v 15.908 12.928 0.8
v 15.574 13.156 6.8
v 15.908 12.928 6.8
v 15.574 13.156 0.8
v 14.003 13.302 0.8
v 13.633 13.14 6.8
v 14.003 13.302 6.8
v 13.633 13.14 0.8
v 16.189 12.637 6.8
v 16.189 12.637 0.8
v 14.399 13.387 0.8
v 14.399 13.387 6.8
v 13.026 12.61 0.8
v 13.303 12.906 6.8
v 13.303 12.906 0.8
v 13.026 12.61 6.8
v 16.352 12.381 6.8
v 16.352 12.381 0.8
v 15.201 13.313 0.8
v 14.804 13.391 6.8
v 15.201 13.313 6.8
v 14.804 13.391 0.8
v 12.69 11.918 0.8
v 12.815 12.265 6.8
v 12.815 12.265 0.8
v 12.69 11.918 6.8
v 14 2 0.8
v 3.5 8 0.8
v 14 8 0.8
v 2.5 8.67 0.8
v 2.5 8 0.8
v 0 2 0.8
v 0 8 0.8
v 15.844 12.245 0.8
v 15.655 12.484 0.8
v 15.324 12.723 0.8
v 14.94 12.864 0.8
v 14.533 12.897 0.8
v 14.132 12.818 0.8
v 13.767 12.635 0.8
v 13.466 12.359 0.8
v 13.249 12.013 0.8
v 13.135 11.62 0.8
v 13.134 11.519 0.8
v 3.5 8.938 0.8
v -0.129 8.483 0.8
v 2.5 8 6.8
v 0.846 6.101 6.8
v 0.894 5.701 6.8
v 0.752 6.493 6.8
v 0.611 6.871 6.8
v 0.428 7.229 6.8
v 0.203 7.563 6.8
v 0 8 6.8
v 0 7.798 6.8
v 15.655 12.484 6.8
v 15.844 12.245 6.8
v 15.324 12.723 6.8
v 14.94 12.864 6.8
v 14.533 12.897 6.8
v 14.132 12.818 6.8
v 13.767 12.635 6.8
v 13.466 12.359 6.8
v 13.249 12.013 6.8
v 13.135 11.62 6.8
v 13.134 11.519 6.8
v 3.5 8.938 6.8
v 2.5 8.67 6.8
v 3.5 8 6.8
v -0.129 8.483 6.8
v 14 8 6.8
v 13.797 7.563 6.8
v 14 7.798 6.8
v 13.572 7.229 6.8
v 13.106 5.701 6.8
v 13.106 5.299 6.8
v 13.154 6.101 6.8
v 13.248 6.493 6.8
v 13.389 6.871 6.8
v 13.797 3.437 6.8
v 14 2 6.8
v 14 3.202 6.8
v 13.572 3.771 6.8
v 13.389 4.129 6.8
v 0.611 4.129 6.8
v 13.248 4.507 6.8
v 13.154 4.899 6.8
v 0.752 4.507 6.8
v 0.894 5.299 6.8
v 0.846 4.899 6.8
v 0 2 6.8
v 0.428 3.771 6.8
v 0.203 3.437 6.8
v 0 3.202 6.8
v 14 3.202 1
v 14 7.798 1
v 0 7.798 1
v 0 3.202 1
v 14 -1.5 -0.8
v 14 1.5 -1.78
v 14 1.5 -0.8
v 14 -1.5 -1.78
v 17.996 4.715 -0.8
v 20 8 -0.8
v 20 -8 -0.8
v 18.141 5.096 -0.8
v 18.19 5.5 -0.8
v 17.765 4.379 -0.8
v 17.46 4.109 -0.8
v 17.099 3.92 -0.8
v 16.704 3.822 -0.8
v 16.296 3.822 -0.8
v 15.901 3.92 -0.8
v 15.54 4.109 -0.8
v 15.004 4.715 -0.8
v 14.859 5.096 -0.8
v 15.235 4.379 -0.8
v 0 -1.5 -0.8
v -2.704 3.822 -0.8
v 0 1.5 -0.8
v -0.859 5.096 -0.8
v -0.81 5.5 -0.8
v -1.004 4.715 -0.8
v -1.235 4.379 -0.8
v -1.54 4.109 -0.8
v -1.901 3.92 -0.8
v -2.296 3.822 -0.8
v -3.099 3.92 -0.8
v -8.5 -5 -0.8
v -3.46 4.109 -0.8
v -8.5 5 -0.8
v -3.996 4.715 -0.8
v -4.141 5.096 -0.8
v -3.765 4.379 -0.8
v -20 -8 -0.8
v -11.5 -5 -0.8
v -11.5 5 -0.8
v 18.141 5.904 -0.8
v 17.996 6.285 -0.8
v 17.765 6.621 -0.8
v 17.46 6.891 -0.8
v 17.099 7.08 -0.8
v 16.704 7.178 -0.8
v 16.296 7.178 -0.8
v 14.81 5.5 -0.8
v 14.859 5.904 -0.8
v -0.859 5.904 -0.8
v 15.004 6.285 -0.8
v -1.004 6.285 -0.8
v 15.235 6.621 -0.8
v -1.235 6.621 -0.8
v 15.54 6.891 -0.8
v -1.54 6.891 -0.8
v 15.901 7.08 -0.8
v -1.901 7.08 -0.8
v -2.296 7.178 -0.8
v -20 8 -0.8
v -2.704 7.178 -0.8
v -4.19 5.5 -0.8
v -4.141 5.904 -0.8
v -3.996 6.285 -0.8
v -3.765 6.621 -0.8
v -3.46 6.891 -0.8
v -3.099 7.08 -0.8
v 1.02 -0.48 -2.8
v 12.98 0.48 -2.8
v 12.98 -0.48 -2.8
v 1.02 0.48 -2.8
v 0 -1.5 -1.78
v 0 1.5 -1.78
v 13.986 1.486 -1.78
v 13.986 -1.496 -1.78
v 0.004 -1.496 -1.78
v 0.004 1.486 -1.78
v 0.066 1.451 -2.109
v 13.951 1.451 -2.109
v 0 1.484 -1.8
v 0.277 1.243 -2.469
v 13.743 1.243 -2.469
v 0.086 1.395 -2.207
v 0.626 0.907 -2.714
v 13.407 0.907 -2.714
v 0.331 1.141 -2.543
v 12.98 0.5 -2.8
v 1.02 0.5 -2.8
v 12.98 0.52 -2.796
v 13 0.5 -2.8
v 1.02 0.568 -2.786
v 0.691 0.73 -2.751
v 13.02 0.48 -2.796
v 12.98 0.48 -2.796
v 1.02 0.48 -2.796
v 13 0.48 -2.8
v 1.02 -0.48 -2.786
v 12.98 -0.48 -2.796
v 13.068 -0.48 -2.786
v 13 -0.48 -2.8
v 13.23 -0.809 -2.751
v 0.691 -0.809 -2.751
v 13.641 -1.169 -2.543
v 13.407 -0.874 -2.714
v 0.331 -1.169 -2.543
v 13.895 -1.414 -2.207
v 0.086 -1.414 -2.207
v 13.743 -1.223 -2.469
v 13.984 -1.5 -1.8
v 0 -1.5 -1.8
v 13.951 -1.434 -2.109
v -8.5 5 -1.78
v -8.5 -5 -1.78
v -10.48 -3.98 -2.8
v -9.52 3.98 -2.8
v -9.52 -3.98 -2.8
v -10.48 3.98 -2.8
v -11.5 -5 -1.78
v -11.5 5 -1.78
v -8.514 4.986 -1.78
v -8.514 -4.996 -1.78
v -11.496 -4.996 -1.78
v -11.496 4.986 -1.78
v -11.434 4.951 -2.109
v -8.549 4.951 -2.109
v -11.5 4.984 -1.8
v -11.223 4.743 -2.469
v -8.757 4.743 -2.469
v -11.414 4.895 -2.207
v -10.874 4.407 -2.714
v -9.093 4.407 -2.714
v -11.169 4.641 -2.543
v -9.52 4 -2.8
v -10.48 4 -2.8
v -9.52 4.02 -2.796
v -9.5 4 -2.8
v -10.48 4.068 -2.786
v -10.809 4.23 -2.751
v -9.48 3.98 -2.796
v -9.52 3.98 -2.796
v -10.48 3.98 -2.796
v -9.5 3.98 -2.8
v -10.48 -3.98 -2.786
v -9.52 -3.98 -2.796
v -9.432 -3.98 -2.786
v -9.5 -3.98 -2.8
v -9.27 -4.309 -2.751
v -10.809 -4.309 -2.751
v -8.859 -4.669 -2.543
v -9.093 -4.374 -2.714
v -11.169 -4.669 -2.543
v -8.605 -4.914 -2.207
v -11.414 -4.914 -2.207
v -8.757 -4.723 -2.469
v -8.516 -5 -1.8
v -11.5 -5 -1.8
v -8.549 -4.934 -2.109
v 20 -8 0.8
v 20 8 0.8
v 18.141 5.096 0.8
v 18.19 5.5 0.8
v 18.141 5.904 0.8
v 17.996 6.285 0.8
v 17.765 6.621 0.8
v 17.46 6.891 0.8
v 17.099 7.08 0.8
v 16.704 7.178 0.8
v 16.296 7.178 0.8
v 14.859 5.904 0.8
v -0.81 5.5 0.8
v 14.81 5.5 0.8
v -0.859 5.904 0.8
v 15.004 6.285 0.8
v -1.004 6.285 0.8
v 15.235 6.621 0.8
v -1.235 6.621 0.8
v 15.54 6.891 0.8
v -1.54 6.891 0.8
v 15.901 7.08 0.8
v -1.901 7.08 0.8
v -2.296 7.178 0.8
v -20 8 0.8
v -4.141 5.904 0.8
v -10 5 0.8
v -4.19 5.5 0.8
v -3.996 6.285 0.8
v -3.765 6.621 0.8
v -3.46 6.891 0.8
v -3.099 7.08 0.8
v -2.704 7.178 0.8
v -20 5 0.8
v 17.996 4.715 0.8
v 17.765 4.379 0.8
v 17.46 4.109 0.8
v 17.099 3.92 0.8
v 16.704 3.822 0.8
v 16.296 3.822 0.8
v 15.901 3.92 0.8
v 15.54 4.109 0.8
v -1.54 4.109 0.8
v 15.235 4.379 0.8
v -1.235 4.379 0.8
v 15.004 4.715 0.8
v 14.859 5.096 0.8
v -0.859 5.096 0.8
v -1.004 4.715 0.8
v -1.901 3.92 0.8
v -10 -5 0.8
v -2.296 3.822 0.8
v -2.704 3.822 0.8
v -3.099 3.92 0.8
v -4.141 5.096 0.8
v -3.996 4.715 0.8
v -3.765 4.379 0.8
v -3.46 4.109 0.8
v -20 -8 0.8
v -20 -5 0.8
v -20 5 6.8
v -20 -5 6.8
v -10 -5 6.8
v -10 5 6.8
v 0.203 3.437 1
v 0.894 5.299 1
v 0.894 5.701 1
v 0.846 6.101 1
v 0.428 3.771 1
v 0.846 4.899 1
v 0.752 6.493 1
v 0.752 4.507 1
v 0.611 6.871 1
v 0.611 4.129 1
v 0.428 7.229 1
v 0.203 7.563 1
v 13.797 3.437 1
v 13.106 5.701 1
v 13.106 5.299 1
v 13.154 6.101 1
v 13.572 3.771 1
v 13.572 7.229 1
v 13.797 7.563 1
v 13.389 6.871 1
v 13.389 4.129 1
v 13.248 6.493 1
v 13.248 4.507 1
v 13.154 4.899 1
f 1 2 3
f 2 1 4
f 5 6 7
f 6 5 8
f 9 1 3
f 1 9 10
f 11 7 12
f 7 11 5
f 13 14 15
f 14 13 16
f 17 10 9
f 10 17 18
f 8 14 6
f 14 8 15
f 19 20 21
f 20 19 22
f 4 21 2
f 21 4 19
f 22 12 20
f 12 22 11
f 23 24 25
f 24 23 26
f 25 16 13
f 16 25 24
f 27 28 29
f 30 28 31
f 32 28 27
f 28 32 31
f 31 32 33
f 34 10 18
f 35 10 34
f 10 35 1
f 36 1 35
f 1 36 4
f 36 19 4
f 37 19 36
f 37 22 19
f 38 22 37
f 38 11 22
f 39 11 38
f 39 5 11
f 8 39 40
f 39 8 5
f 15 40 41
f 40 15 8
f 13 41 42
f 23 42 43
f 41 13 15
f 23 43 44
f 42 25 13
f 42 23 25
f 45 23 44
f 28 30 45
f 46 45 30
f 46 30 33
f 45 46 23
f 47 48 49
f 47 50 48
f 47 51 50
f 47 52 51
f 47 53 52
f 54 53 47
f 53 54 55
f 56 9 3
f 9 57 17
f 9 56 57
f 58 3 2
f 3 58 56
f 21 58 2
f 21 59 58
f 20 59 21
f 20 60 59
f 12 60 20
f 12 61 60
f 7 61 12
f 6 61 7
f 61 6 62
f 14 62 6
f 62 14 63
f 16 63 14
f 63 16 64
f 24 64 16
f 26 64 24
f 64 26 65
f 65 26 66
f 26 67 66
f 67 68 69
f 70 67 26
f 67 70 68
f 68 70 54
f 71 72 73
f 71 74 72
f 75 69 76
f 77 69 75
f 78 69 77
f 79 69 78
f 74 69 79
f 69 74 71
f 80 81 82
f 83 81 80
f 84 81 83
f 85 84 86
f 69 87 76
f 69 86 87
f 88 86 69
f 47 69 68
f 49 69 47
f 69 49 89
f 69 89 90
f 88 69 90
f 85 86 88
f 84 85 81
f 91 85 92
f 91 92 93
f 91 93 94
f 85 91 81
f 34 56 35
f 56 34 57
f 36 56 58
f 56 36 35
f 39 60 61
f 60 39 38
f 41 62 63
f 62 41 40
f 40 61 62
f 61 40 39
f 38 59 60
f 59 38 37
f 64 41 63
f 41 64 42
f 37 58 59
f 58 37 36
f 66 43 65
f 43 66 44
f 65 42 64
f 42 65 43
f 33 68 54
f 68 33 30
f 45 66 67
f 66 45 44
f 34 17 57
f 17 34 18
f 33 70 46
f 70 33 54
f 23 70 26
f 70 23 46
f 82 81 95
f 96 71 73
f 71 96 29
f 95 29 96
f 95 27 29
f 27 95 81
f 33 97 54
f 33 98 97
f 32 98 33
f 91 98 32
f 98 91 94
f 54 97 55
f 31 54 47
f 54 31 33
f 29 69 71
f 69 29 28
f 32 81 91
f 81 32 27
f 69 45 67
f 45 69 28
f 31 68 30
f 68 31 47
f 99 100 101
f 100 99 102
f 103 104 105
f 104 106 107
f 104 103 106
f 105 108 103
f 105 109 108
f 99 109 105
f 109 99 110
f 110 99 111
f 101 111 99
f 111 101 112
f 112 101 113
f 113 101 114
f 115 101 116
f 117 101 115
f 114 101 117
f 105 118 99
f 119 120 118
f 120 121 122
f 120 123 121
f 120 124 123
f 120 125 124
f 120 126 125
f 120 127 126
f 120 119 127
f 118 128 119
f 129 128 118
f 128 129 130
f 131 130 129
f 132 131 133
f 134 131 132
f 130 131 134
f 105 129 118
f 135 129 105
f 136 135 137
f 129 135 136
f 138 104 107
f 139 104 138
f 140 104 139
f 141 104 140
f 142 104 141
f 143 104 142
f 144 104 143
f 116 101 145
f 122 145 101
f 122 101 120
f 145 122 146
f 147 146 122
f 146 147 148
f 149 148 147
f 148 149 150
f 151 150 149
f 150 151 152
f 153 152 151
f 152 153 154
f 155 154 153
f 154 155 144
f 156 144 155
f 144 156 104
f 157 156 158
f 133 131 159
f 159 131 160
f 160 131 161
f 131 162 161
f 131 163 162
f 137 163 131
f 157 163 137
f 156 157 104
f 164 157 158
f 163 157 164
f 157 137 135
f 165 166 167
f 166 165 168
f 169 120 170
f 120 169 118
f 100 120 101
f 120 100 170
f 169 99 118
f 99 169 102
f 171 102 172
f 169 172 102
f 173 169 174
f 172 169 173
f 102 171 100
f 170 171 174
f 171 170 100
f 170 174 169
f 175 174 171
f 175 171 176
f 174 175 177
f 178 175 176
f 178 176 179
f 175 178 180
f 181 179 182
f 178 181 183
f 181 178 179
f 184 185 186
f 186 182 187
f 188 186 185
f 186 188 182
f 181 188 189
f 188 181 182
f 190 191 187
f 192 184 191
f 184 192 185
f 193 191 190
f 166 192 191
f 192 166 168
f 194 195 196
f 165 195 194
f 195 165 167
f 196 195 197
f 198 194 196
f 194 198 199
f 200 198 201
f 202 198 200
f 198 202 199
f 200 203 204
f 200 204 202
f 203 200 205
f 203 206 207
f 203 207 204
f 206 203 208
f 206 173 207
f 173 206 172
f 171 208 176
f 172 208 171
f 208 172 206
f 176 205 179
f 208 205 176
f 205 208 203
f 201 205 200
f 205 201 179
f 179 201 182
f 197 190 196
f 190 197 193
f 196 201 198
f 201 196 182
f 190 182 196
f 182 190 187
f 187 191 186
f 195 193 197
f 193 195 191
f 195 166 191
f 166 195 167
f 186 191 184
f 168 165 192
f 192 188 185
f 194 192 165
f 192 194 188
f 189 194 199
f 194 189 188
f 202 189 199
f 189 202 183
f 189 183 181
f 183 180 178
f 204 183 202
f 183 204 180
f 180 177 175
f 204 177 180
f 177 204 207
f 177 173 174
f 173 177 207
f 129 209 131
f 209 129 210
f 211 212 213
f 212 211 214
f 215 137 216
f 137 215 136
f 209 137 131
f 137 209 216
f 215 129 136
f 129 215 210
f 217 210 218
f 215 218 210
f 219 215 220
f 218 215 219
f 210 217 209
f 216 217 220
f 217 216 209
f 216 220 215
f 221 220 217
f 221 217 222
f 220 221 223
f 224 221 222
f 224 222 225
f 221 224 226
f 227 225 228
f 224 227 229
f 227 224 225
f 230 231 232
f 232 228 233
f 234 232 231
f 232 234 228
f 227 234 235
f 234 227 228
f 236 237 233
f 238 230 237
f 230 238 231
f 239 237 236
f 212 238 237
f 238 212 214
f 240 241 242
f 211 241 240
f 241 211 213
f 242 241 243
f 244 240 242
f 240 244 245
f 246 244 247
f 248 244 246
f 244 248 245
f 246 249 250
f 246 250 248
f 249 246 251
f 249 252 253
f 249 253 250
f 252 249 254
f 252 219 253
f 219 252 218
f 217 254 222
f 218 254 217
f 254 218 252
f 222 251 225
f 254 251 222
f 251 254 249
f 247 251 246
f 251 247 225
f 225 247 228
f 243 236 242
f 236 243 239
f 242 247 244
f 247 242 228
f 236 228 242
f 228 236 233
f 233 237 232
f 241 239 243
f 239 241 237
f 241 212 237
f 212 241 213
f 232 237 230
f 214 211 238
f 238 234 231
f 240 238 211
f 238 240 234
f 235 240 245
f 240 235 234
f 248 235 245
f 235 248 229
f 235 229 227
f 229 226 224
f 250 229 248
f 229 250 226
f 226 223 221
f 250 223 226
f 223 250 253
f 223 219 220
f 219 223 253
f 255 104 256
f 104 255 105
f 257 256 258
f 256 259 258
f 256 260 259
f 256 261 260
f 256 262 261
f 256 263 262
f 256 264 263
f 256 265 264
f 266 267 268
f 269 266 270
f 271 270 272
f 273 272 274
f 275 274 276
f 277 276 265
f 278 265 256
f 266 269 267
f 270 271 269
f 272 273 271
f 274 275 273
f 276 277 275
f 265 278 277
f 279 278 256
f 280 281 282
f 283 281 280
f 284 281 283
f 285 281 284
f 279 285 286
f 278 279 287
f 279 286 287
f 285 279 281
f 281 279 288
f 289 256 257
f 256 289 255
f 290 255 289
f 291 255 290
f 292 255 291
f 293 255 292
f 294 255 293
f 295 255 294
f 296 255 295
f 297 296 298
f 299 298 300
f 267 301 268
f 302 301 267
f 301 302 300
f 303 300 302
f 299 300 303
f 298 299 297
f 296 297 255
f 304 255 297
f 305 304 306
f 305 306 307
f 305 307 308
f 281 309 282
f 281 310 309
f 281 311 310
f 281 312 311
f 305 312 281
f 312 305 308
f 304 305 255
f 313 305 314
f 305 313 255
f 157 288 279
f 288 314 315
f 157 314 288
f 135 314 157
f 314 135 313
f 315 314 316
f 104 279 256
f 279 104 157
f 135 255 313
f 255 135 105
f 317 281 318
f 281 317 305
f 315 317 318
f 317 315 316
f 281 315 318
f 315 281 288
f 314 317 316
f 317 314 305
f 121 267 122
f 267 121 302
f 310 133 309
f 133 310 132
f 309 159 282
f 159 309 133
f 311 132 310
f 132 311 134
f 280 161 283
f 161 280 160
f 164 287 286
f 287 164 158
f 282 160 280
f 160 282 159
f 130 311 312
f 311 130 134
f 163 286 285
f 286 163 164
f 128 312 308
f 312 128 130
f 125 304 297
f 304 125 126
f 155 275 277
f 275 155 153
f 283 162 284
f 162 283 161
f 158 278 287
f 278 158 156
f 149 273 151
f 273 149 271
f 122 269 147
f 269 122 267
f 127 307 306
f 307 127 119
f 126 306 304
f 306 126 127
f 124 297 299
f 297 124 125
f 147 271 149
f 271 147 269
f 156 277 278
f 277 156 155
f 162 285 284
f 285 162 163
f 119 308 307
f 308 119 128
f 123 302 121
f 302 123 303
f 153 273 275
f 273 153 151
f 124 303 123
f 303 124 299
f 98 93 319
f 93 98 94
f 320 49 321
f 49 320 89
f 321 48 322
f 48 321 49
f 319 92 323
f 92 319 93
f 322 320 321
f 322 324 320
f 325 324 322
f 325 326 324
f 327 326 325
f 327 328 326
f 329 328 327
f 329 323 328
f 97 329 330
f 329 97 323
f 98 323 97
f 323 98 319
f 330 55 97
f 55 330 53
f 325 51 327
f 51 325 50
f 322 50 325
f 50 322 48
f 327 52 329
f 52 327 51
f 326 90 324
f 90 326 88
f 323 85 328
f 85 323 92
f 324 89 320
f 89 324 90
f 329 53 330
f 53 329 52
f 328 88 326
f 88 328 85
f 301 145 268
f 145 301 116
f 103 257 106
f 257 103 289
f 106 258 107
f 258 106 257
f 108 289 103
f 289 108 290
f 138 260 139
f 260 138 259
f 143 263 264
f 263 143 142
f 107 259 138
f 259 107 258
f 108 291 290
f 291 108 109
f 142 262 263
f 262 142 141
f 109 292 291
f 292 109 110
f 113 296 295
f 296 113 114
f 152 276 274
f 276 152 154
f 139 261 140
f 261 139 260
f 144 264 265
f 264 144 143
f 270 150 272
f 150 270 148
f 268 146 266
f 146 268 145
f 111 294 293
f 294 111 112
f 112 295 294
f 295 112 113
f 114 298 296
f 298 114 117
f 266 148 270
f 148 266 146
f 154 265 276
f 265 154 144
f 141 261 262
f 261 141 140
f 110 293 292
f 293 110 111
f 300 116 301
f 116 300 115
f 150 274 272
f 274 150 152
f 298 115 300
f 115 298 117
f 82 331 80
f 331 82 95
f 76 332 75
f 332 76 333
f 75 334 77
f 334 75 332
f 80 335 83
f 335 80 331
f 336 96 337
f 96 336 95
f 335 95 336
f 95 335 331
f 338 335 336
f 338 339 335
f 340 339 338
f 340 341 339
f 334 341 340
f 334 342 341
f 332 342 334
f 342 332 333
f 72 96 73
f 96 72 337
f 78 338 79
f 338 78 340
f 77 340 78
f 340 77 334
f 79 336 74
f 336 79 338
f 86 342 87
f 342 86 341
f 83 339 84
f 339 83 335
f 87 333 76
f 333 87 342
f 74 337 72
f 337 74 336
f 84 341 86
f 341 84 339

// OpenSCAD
difference() {
  union() {
    // pcb
    // volume
    cube(size=[40.0, 16.0, 1.6], center=true);
    // switch
    translate(v=[7.0, 5.0, 3.8])
    union() {
      // endstop_body
      // volume
      cube(size=[14.0, 6.0, 6.0], center=true);
      // switch
      translate(v=[-4.0, 3.5, 0.0])
      // volume
      cube(size=[1.0, 1.0, 6.0], center=true);
      // lever
      #translate(v=[-7.0, 3.0, 0])
      rotate(a=[0, 0, 15])
      translate(v=[13.5, 0.0, 0])
      {
        translate(v=[-6.75, 0.25, 0])
        // volume
        cube(size=[13.5, 0.5, 6.0], center=true);
        translate(v=[1.5, -0.5, 0])
        intersection() {
          translate(v=[0, 5.5, 0])
          cube(size=[10, 10, 20], center=true);
          difference() {
            cylinder(h=6, d=4, $fn=31, center=true);
            cylinder(h=7, d=3, $fn=23, center=true);
          }
        }
      }
    }
    // connector
    translate(v=[-15.0, 0.0, 3.8])
    // volume
    cube(size=[10.0, 10.0, 6.0], center=true);
    // switch_welds
    difference() {
      // volume
      translate(v=[7.0, 0.0, -1.8])
      cube(size=[14.0, 3.0, 2.0], center=true);
      // front_bottom_chamfer
      translate(v=[-0.02, 0.5, -1.8])
      rotate(a=[0, 90, 0])
      linear_extrude(height=14.04, center=false, convexity=10, twist=0.0, scale=1.0)
      difference() {
        // box
        translate(v=[0.5, 0.5, 0.0])
        square(size=[1.04, 1.04], center=true);
        // fillet
        circle(d=2, $fn=15);
      }
      // back_bottom_chamfer
      translate(v=[-0.02, -0.5, -1.8])
      rotate(a=[270, 0, 0])
      rotate(a=[0, 90, 0])
      linear_extrude(height=14.04, center=false, convexity=10, twist=0.0, scale=1.0)
      difference() {
        // box
        translate(v=[0.5, 0.5, 0.0])
        square(size=[1.04, 1.04], center=true);
        // fillet
        circle(d=2, $fn=15);
      }
      // bottom_right_chamfer
      translate(v=[13.0, 1.52, -1.8])
      rotate(a=[90, 90, 0])
      linear_extrude(height=3.04, center=false, convexity=10, twist=0.0, scale=1.0)
      difference() {
        // box
        translate(v=[0.5, 0.5, 0.0])
        square(size=[1.04, 1.04], center=true);
        // fillet
        circle(d=2, $fn=15);
      }
      // bottom_left_chamfer
      translate(v=[1.0, 1.52, -1.8])
      rotate(a=[90, 180, 0])
      linear_extrude(height=3.04, center=false, convexity=10, twist=0.0, scale=1.0)
      difference() {
        // box
        translate(v=[0.5, 0.5, 0.0])
        square(size=[1.04, 1.04], center=true);
        // fillet
        circle(d=2, $fn=15);
      }
    }
    // connector_welds
    difference() {
      // volume
      translate(v=[-10.0, 0.0, -1.8])
      cube(size=[3.0, 10.0, 2.0], center=true);
      // front_bottom_chamfer
      translate(v=[-11.52, 4.0, -1.8])
      rotate(a=[0, 90, 0])
      linear_extrude(height=3.04, center=false, convexity=10, twist=0.0, scale=1.0)
      difference() {
        // box
        translate(v=[0.5, 0.5, 0.0])
        square(size=[1.04, 1.04], center=true);
        // fillet
        circle(d=2, $fn=15);
      }
      // back_bottom_chamfer
      translate(v=[-11.52, -4.0, -1.8])
      rotate(a=[270, 0, 0])
      rotate(a=[0, 90, 0])
      linear_extrude(height=3.04, center=false, convexity=10, twist=0.0, scale=1.0)
      difference() {
        // box
        translate(v=[0.5, 0.5, 0.0])
        square(size=[1.04, 1.04], center=true);
        // fillet
        circle(d=2, $fn=15);
      }
      // bottom_right_chamfer
      translate(v=[-9.5, 5.02, -1.8])
      rotate(a=[90, 90, 0])
      linear_extrude(height=10.04, center=false, convexity=10, twist=0.0, scale=1.0)
      difference() {
        // box
        translate(v=[0.5, 0.5, 0.0])
        square(size=[1.04, 1.04], center=true);
        // fillet
        circle(d=2, $fn=15);
      }
      // bottom_left_chamfer
      translate(v=[-10.5, 5.02, -1.8])
      rotate(a=[90, 180, 0])
      linear_extrude(height=10.04, center=false, convexity=10, twist=0.0, scale=1.0)
      difference() {
        // box
        translate(v=[0.5, 0.5, 0.0])
        square(size=[1.04, 1.04], center=true);
        // fillet
        circle(d=2, $fn=15);
      }
    }
  }
  // bolts
  #union() {
    translate(v=[7.0, 0, 0])
    mirror(v=[1, 0, 0])
    translate(v=[9.5, 5.5, -3.98])
    rotate(a=[180, 0, 0])
    union() {
      // thread
      cylinder(h=10, d=3.38, $fn=26, center=true);
      // head
      translate(v=[0, 0, -6.38])
      cylinder(h=2.8, d=6.8, $fn=53, center=true);
      // head_clearance
      translate(v=[0, 0, -57.76])
      cylinder(h=100, d=6.8, $fn=53, center=true);
      translate(v=[0, 0, 0.7])
      // nut
      cylinder(h=2.8, d=6.8, $fn=6, center=true);
    }
    translate(v=[16.5, 5.5, -3.98])
    rotate(a=[180, 0, 0])
    union() {
      // thread
      cylinder(h=10, d=3.38, $fn=26, center=true);
      // head
      translate(v=[0, 0, -6.38])
      cylinder(h=2.8, d=6.8, $fn=53, center=true);
      // head_clearance
      translate(v=[0, 0, -57.76])
      cylinder(h=100, d=6.8, $fn=53, center=true);
      translate(v=[0, 0, 0.7])
      // nut
      cylinder(h=2.8, d=6.8, $fn=6, center=true);
    }
  }
}
